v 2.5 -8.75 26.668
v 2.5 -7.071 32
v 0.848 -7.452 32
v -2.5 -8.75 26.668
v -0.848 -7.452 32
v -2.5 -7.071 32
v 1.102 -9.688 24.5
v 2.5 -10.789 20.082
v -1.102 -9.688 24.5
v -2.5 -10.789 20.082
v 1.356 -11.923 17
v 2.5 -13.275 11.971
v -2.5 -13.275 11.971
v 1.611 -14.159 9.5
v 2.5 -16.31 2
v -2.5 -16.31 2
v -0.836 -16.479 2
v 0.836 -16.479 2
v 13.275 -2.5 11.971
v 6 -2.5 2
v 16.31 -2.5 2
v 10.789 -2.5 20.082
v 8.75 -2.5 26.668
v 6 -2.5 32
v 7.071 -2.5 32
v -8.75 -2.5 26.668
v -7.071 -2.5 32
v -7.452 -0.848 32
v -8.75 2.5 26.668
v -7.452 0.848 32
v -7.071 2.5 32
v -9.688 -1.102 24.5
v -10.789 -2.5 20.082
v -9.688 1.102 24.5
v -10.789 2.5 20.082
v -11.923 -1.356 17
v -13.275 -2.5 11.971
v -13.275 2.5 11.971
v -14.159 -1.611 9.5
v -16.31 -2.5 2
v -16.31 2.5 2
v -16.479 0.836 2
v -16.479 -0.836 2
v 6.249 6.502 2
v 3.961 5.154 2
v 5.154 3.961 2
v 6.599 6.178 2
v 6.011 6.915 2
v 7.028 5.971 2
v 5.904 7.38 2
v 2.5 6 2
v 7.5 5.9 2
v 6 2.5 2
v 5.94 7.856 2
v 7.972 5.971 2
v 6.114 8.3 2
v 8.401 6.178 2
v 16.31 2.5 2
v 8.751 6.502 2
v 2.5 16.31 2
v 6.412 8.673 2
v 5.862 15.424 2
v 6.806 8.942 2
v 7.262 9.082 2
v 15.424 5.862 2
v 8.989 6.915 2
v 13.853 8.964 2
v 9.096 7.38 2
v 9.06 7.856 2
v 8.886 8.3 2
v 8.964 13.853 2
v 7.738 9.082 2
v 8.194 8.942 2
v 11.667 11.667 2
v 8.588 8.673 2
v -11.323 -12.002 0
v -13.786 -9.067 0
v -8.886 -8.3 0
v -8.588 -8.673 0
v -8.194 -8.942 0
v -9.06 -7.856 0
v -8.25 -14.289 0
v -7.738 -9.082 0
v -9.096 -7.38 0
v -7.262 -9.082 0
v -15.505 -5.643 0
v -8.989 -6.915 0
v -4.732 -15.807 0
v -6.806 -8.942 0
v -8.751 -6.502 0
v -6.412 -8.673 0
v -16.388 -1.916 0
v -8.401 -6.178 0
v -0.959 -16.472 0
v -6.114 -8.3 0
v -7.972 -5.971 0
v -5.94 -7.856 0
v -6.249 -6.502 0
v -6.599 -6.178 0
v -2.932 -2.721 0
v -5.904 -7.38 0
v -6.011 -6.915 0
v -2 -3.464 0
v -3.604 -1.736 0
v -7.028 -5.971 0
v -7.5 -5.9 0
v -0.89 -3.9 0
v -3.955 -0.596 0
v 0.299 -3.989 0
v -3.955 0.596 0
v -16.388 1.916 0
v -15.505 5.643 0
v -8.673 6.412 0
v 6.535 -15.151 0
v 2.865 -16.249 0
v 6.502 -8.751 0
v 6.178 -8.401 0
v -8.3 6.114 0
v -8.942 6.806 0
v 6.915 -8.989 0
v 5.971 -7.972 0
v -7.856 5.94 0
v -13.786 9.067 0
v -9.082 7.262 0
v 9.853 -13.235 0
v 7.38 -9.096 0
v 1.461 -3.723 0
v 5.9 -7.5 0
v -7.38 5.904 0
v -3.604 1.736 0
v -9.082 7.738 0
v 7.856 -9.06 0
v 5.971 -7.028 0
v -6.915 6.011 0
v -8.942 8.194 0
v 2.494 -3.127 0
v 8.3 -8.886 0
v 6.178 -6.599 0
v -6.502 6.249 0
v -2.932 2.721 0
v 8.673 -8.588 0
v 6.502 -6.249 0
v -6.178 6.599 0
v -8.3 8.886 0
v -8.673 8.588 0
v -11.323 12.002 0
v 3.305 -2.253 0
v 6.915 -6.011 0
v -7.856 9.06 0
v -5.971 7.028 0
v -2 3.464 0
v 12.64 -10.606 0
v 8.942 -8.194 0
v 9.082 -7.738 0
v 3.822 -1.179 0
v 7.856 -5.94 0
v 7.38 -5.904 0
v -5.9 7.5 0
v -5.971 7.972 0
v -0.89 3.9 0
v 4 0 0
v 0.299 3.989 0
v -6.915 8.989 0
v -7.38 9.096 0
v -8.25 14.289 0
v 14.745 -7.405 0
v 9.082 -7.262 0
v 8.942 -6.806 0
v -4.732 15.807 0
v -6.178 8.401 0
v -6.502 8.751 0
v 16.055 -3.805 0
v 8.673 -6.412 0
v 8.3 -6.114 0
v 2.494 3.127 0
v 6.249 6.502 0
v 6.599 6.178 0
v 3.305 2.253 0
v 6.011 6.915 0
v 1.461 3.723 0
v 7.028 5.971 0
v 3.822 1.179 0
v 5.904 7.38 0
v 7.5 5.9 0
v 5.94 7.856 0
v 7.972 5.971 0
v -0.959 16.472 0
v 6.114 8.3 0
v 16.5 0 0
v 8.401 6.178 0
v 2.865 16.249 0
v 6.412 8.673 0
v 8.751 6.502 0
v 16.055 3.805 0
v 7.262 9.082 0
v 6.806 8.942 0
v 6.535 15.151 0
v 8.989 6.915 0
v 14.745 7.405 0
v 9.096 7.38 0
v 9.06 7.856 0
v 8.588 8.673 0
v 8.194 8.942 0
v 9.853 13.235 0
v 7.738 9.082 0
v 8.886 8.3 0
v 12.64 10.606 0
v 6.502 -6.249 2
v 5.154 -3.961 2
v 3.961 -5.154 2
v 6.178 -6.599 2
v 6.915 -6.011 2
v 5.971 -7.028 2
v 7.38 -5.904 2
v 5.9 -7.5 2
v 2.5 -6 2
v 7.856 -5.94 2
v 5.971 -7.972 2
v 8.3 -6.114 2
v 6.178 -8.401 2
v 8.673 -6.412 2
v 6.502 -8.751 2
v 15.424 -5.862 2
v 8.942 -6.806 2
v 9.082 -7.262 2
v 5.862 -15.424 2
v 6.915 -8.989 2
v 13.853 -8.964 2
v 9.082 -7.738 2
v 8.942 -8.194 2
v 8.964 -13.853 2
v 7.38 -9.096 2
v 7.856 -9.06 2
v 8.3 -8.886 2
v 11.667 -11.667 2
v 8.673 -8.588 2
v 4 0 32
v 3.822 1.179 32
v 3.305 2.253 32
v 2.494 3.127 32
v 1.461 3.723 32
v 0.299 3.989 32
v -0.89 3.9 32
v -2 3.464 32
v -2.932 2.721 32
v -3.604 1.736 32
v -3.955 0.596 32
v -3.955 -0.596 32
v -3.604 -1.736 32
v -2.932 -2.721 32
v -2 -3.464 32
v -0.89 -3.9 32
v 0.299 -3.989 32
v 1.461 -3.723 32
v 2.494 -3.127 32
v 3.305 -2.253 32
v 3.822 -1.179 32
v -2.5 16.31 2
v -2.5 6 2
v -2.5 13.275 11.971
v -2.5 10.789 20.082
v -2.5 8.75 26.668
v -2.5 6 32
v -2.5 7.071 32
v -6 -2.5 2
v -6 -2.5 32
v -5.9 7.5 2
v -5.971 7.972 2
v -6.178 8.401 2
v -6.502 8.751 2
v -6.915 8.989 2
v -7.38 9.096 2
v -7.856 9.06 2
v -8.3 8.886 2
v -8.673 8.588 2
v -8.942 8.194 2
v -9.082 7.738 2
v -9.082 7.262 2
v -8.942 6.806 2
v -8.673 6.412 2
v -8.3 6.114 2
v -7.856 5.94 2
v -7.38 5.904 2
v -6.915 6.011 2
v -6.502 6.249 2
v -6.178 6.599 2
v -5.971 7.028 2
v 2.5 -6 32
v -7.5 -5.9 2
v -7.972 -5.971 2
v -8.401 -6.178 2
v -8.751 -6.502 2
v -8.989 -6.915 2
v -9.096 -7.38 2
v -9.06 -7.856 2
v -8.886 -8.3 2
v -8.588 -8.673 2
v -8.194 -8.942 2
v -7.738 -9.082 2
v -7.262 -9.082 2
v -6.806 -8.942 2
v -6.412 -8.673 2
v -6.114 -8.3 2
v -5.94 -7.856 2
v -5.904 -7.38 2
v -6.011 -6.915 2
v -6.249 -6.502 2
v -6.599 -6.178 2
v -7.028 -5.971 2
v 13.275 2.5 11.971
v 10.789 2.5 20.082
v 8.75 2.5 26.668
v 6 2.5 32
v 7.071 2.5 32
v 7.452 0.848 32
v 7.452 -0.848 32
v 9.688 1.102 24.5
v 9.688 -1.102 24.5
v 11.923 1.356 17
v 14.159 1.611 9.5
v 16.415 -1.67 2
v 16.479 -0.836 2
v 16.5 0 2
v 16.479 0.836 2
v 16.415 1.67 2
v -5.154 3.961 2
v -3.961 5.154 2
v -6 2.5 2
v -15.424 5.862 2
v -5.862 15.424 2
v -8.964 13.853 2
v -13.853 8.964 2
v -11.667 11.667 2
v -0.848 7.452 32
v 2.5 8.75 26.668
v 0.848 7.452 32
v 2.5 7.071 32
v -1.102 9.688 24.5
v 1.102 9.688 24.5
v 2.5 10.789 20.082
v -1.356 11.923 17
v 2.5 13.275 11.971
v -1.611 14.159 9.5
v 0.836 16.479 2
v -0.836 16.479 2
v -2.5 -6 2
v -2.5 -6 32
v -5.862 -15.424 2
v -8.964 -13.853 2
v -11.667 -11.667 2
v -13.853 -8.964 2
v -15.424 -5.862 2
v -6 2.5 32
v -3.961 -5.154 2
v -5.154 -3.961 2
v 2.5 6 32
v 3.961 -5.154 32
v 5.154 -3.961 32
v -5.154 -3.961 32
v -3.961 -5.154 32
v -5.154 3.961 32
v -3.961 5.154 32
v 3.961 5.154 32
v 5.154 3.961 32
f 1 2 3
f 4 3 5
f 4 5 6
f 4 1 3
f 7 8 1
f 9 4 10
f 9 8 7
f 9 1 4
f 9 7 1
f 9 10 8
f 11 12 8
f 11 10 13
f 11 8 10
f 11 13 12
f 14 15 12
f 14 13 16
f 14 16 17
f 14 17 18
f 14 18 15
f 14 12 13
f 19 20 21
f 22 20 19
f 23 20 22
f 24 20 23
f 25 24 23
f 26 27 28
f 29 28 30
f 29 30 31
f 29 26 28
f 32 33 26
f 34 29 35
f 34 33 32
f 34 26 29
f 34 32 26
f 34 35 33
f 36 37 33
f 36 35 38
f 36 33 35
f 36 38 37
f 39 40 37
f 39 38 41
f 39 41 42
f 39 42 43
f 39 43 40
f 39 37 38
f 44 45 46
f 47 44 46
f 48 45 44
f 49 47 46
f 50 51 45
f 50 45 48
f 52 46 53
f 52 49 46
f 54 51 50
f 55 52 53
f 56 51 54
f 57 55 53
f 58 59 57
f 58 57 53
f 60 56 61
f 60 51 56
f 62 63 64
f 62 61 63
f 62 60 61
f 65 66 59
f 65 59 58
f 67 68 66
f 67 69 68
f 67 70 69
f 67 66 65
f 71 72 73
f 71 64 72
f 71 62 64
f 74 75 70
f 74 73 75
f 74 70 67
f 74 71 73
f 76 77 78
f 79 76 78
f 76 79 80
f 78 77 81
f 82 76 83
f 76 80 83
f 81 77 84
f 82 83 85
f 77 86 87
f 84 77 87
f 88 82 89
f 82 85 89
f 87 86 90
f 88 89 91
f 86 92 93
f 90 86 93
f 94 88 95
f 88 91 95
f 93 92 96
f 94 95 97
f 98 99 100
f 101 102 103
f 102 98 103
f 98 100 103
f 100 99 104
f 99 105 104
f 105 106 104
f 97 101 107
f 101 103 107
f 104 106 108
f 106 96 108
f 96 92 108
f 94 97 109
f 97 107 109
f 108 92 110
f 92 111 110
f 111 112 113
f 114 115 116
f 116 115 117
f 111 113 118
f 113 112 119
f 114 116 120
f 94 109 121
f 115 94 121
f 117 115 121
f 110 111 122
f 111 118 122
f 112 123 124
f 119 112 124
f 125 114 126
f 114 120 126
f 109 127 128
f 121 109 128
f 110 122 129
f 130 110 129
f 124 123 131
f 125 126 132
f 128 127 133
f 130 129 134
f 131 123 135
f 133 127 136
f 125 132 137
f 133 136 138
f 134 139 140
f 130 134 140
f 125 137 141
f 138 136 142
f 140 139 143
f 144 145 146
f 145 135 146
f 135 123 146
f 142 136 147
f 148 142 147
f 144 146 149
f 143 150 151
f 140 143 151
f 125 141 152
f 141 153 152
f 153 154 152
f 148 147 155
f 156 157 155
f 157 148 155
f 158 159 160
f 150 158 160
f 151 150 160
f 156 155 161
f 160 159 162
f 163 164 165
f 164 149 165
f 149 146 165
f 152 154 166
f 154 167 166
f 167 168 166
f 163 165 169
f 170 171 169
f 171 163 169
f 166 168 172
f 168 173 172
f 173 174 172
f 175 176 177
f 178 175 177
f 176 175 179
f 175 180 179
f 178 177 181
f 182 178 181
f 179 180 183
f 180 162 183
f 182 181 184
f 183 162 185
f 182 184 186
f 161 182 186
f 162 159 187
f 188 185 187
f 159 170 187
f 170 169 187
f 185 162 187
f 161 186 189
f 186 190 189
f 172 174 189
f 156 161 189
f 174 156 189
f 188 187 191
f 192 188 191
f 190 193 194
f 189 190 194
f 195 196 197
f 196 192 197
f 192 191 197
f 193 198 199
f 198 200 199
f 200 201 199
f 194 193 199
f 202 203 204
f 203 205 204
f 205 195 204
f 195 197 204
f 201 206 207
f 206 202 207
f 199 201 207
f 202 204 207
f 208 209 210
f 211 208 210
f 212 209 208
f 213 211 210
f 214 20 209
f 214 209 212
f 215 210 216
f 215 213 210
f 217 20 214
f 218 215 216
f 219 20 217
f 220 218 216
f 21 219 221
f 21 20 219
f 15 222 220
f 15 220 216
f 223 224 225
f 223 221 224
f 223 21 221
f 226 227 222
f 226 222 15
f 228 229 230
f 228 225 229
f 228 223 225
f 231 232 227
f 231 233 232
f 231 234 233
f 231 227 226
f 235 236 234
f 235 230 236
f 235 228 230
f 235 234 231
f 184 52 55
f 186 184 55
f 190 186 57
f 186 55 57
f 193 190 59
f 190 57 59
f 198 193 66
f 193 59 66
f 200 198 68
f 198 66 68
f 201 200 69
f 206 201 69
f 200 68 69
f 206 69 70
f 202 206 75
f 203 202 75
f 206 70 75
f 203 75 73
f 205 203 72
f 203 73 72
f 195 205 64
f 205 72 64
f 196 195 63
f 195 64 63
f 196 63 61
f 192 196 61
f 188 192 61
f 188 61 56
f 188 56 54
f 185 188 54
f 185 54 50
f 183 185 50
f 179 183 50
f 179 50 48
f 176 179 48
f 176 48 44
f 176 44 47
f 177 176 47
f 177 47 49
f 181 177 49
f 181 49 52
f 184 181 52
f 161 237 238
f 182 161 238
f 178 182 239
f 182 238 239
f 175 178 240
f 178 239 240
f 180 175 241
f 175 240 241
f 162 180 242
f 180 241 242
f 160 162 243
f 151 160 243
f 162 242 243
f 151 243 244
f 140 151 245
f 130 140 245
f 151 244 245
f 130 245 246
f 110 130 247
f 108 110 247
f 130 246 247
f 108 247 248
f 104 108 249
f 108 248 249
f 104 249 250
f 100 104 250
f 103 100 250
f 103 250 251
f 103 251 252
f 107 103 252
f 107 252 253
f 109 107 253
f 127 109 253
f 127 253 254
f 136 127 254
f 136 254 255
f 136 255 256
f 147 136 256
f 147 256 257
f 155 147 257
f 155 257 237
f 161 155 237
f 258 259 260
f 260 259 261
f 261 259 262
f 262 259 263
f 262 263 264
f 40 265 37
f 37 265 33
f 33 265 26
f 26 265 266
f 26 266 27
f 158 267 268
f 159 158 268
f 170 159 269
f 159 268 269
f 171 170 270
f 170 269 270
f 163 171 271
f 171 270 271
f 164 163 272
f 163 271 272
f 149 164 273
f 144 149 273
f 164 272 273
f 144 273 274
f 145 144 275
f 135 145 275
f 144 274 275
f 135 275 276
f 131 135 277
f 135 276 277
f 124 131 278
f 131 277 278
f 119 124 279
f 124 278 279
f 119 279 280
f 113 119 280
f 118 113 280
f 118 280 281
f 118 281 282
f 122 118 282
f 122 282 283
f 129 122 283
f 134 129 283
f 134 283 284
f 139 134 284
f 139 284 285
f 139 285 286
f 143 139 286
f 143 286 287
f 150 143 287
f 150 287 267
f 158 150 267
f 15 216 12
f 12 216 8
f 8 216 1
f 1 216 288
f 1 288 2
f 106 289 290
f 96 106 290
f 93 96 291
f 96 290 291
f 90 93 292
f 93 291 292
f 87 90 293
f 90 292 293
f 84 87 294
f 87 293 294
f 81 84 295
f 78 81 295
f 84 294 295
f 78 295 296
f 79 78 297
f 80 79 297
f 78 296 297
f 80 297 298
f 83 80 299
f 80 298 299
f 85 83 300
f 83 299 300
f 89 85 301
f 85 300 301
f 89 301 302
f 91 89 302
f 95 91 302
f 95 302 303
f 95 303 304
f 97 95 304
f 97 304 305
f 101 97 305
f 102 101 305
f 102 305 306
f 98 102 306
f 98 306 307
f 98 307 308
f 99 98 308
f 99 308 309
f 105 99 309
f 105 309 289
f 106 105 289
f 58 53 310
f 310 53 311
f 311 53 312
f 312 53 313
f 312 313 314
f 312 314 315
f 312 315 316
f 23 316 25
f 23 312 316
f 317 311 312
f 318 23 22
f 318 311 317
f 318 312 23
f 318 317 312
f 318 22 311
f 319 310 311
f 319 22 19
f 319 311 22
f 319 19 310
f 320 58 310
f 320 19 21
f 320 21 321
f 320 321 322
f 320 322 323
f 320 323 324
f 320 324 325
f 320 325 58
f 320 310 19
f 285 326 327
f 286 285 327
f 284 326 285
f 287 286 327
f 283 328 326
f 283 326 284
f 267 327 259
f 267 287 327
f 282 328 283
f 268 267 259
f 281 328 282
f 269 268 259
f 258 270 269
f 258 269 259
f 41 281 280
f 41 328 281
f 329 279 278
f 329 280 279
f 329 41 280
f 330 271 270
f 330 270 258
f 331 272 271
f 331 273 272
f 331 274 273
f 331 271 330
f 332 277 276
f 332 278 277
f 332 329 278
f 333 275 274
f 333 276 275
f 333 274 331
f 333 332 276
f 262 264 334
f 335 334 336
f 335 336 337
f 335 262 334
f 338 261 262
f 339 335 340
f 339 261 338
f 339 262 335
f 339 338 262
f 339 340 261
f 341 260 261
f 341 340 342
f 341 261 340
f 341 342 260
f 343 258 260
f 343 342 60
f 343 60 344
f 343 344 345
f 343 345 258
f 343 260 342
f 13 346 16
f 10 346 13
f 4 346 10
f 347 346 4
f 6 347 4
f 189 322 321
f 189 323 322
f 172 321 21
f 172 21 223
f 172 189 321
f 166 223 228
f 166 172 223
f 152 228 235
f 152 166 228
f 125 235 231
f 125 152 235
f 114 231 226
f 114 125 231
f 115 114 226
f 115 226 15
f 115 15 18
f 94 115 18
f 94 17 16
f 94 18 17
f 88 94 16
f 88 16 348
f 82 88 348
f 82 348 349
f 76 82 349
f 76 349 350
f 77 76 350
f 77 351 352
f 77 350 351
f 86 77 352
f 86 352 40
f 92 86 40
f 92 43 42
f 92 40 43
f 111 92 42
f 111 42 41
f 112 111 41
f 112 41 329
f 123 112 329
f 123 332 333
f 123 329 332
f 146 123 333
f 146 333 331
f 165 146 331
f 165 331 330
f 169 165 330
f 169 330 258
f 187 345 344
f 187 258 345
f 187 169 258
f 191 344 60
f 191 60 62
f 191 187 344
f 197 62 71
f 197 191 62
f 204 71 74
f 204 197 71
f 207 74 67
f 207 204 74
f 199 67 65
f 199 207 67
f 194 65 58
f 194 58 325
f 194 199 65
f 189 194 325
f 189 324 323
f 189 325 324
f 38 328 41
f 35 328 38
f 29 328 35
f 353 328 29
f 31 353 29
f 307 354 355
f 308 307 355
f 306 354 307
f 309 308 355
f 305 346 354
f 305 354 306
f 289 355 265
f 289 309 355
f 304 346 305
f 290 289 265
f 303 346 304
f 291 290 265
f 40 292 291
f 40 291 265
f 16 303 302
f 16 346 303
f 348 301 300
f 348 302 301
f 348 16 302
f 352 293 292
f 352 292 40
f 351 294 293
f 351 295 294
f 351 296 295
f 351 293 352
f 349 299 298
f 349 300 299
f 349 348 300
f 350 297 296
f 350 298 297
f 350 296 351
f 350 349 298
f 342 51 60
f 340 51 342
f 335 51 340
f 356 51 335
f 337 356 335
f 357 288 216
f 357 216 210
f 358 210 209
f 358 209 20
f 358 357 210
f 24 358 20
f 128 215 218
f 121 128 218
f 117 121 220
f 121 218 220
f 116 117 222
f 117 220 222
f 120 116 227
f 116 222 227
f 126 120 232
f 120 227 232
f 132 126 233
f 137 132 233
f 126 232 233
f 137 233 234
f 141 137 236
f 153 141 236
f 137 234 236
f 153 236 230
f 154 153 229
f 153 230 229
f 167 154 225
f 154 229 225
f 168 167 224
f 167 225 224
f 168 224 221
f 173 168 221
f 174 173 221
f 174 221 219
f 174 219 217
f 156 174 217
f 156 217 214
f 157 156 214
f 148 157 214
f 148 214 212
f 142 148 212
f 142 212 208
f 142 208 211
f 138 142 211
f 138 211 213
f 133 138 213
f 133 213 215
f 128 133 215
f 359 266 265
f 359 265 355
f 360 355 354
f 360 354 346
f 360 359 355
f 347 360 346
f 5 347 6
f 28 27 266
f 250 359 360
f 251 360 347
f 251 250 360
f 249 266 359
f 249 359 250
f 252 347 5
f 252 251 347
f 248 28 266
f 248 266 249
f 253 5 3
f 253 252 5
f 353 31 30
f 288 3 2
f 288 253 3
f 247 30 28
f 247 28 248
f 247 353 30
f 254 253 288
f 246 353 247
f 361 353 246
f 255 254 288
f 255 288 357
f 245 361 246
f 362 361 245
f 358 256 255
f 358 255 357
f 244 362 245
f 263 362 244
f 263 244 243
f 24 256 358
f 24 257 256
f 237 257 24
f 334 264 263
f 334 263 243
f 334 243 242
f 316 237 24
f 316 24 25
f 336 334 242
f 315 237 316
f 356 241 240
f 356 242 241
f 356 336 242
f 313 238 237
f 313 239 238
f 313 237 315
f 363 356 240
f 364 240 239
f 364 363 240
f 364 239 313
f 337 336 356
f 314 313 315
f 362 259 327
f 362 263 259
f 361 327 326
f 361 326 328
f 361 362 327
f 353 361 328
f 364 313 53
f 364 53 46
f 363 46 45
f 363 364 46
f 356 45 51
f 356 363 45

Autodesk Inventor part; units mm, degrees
ref_plane "YZ Plane" through (0, 0, 0) normal (1, 0, 0) x (0, 1, 0)
ref_plane "XZ Plane" through (0, 0, 0) normal (0, 1, 0) x (-1, 0, 0)
ref_plane "XY Plane" through (0, 0, 0) normal (0, 0, 1) x (1, 0, 0)
sketch "Esquisse1" plane through (0, 0, 0) normal (0, 0, 1) x (1, 0, 0)
  circle A0 centre (0, 0) radius 16.5
  dimension "d0" = 33
extrude "Extrusion1" add sketch "Esquisse1" along normal blind 32
sketch "Esquisse2" plane through (0, 0, 32) normal (0, 0, 1) x (1, 0, 0)
  circle A0 centre (0, 0) radius 4
  dimension "d3" = 8
extrude "Extrusion2" cut sketch "Esquisse2" against normal through all
chamfer "Chanfrein1" distance 9 distance2 30 1 edges at (-16.5, 0, 32) measured on face at (12.1348, -1.6353, 32)
sketch "Esquisse3" plane through (0, 0, 32) normal (0, 0, 1) x (1, 0, 0)
  line L0 (2.5, 6) -> (2.5, 16.5)
  line L1 (6, 2.5) -> (16.5, 2.5)
  arc A0 (6, 2.5) -> (2.5, 6) centre (0, 0) ccw
  arc A1 (16.5, 2.5) -> (2.5, 16.5) centre (0, 0) ccw
  dimension "d9" = 2.5
  dimension "d10" = 2.5
  dimension "d11" = 6
  dimension "d12" = 16.5
extrude "Extrusion3" cut sketch "Esquisse3" against normal blind 30
pattern_circular "Réseau circulaire1" count 4 over 360 about axis through (0, 0, 32) along (0, 0, -1) of "Extrusion3"
sketch "Esquisse4" plane through (-16.3095, 2.5, 2) normal (0, 0, 1) x (1, 0, 0)
  circle A0 centre (8.8095, 5) radius 1.6
  point P0 (16.3095, -2.5)
  dimension "d18" = 3.2
  dimension "d19" = 7.5
  dimension "d20" = 7.5
extrude "Extrusion4" cut sketch "Esquisse4" against normal through all
pattern_circular "Réseau circulaire2" count 4 over 360 about axis through (0, 0, 32) along (0, 0, -1) of "Extrusion4"
equation "\"d10\" = d9"
equation "\"d20\" = d19"
properties part number "PieddeMat" material "Plastique ABS"
